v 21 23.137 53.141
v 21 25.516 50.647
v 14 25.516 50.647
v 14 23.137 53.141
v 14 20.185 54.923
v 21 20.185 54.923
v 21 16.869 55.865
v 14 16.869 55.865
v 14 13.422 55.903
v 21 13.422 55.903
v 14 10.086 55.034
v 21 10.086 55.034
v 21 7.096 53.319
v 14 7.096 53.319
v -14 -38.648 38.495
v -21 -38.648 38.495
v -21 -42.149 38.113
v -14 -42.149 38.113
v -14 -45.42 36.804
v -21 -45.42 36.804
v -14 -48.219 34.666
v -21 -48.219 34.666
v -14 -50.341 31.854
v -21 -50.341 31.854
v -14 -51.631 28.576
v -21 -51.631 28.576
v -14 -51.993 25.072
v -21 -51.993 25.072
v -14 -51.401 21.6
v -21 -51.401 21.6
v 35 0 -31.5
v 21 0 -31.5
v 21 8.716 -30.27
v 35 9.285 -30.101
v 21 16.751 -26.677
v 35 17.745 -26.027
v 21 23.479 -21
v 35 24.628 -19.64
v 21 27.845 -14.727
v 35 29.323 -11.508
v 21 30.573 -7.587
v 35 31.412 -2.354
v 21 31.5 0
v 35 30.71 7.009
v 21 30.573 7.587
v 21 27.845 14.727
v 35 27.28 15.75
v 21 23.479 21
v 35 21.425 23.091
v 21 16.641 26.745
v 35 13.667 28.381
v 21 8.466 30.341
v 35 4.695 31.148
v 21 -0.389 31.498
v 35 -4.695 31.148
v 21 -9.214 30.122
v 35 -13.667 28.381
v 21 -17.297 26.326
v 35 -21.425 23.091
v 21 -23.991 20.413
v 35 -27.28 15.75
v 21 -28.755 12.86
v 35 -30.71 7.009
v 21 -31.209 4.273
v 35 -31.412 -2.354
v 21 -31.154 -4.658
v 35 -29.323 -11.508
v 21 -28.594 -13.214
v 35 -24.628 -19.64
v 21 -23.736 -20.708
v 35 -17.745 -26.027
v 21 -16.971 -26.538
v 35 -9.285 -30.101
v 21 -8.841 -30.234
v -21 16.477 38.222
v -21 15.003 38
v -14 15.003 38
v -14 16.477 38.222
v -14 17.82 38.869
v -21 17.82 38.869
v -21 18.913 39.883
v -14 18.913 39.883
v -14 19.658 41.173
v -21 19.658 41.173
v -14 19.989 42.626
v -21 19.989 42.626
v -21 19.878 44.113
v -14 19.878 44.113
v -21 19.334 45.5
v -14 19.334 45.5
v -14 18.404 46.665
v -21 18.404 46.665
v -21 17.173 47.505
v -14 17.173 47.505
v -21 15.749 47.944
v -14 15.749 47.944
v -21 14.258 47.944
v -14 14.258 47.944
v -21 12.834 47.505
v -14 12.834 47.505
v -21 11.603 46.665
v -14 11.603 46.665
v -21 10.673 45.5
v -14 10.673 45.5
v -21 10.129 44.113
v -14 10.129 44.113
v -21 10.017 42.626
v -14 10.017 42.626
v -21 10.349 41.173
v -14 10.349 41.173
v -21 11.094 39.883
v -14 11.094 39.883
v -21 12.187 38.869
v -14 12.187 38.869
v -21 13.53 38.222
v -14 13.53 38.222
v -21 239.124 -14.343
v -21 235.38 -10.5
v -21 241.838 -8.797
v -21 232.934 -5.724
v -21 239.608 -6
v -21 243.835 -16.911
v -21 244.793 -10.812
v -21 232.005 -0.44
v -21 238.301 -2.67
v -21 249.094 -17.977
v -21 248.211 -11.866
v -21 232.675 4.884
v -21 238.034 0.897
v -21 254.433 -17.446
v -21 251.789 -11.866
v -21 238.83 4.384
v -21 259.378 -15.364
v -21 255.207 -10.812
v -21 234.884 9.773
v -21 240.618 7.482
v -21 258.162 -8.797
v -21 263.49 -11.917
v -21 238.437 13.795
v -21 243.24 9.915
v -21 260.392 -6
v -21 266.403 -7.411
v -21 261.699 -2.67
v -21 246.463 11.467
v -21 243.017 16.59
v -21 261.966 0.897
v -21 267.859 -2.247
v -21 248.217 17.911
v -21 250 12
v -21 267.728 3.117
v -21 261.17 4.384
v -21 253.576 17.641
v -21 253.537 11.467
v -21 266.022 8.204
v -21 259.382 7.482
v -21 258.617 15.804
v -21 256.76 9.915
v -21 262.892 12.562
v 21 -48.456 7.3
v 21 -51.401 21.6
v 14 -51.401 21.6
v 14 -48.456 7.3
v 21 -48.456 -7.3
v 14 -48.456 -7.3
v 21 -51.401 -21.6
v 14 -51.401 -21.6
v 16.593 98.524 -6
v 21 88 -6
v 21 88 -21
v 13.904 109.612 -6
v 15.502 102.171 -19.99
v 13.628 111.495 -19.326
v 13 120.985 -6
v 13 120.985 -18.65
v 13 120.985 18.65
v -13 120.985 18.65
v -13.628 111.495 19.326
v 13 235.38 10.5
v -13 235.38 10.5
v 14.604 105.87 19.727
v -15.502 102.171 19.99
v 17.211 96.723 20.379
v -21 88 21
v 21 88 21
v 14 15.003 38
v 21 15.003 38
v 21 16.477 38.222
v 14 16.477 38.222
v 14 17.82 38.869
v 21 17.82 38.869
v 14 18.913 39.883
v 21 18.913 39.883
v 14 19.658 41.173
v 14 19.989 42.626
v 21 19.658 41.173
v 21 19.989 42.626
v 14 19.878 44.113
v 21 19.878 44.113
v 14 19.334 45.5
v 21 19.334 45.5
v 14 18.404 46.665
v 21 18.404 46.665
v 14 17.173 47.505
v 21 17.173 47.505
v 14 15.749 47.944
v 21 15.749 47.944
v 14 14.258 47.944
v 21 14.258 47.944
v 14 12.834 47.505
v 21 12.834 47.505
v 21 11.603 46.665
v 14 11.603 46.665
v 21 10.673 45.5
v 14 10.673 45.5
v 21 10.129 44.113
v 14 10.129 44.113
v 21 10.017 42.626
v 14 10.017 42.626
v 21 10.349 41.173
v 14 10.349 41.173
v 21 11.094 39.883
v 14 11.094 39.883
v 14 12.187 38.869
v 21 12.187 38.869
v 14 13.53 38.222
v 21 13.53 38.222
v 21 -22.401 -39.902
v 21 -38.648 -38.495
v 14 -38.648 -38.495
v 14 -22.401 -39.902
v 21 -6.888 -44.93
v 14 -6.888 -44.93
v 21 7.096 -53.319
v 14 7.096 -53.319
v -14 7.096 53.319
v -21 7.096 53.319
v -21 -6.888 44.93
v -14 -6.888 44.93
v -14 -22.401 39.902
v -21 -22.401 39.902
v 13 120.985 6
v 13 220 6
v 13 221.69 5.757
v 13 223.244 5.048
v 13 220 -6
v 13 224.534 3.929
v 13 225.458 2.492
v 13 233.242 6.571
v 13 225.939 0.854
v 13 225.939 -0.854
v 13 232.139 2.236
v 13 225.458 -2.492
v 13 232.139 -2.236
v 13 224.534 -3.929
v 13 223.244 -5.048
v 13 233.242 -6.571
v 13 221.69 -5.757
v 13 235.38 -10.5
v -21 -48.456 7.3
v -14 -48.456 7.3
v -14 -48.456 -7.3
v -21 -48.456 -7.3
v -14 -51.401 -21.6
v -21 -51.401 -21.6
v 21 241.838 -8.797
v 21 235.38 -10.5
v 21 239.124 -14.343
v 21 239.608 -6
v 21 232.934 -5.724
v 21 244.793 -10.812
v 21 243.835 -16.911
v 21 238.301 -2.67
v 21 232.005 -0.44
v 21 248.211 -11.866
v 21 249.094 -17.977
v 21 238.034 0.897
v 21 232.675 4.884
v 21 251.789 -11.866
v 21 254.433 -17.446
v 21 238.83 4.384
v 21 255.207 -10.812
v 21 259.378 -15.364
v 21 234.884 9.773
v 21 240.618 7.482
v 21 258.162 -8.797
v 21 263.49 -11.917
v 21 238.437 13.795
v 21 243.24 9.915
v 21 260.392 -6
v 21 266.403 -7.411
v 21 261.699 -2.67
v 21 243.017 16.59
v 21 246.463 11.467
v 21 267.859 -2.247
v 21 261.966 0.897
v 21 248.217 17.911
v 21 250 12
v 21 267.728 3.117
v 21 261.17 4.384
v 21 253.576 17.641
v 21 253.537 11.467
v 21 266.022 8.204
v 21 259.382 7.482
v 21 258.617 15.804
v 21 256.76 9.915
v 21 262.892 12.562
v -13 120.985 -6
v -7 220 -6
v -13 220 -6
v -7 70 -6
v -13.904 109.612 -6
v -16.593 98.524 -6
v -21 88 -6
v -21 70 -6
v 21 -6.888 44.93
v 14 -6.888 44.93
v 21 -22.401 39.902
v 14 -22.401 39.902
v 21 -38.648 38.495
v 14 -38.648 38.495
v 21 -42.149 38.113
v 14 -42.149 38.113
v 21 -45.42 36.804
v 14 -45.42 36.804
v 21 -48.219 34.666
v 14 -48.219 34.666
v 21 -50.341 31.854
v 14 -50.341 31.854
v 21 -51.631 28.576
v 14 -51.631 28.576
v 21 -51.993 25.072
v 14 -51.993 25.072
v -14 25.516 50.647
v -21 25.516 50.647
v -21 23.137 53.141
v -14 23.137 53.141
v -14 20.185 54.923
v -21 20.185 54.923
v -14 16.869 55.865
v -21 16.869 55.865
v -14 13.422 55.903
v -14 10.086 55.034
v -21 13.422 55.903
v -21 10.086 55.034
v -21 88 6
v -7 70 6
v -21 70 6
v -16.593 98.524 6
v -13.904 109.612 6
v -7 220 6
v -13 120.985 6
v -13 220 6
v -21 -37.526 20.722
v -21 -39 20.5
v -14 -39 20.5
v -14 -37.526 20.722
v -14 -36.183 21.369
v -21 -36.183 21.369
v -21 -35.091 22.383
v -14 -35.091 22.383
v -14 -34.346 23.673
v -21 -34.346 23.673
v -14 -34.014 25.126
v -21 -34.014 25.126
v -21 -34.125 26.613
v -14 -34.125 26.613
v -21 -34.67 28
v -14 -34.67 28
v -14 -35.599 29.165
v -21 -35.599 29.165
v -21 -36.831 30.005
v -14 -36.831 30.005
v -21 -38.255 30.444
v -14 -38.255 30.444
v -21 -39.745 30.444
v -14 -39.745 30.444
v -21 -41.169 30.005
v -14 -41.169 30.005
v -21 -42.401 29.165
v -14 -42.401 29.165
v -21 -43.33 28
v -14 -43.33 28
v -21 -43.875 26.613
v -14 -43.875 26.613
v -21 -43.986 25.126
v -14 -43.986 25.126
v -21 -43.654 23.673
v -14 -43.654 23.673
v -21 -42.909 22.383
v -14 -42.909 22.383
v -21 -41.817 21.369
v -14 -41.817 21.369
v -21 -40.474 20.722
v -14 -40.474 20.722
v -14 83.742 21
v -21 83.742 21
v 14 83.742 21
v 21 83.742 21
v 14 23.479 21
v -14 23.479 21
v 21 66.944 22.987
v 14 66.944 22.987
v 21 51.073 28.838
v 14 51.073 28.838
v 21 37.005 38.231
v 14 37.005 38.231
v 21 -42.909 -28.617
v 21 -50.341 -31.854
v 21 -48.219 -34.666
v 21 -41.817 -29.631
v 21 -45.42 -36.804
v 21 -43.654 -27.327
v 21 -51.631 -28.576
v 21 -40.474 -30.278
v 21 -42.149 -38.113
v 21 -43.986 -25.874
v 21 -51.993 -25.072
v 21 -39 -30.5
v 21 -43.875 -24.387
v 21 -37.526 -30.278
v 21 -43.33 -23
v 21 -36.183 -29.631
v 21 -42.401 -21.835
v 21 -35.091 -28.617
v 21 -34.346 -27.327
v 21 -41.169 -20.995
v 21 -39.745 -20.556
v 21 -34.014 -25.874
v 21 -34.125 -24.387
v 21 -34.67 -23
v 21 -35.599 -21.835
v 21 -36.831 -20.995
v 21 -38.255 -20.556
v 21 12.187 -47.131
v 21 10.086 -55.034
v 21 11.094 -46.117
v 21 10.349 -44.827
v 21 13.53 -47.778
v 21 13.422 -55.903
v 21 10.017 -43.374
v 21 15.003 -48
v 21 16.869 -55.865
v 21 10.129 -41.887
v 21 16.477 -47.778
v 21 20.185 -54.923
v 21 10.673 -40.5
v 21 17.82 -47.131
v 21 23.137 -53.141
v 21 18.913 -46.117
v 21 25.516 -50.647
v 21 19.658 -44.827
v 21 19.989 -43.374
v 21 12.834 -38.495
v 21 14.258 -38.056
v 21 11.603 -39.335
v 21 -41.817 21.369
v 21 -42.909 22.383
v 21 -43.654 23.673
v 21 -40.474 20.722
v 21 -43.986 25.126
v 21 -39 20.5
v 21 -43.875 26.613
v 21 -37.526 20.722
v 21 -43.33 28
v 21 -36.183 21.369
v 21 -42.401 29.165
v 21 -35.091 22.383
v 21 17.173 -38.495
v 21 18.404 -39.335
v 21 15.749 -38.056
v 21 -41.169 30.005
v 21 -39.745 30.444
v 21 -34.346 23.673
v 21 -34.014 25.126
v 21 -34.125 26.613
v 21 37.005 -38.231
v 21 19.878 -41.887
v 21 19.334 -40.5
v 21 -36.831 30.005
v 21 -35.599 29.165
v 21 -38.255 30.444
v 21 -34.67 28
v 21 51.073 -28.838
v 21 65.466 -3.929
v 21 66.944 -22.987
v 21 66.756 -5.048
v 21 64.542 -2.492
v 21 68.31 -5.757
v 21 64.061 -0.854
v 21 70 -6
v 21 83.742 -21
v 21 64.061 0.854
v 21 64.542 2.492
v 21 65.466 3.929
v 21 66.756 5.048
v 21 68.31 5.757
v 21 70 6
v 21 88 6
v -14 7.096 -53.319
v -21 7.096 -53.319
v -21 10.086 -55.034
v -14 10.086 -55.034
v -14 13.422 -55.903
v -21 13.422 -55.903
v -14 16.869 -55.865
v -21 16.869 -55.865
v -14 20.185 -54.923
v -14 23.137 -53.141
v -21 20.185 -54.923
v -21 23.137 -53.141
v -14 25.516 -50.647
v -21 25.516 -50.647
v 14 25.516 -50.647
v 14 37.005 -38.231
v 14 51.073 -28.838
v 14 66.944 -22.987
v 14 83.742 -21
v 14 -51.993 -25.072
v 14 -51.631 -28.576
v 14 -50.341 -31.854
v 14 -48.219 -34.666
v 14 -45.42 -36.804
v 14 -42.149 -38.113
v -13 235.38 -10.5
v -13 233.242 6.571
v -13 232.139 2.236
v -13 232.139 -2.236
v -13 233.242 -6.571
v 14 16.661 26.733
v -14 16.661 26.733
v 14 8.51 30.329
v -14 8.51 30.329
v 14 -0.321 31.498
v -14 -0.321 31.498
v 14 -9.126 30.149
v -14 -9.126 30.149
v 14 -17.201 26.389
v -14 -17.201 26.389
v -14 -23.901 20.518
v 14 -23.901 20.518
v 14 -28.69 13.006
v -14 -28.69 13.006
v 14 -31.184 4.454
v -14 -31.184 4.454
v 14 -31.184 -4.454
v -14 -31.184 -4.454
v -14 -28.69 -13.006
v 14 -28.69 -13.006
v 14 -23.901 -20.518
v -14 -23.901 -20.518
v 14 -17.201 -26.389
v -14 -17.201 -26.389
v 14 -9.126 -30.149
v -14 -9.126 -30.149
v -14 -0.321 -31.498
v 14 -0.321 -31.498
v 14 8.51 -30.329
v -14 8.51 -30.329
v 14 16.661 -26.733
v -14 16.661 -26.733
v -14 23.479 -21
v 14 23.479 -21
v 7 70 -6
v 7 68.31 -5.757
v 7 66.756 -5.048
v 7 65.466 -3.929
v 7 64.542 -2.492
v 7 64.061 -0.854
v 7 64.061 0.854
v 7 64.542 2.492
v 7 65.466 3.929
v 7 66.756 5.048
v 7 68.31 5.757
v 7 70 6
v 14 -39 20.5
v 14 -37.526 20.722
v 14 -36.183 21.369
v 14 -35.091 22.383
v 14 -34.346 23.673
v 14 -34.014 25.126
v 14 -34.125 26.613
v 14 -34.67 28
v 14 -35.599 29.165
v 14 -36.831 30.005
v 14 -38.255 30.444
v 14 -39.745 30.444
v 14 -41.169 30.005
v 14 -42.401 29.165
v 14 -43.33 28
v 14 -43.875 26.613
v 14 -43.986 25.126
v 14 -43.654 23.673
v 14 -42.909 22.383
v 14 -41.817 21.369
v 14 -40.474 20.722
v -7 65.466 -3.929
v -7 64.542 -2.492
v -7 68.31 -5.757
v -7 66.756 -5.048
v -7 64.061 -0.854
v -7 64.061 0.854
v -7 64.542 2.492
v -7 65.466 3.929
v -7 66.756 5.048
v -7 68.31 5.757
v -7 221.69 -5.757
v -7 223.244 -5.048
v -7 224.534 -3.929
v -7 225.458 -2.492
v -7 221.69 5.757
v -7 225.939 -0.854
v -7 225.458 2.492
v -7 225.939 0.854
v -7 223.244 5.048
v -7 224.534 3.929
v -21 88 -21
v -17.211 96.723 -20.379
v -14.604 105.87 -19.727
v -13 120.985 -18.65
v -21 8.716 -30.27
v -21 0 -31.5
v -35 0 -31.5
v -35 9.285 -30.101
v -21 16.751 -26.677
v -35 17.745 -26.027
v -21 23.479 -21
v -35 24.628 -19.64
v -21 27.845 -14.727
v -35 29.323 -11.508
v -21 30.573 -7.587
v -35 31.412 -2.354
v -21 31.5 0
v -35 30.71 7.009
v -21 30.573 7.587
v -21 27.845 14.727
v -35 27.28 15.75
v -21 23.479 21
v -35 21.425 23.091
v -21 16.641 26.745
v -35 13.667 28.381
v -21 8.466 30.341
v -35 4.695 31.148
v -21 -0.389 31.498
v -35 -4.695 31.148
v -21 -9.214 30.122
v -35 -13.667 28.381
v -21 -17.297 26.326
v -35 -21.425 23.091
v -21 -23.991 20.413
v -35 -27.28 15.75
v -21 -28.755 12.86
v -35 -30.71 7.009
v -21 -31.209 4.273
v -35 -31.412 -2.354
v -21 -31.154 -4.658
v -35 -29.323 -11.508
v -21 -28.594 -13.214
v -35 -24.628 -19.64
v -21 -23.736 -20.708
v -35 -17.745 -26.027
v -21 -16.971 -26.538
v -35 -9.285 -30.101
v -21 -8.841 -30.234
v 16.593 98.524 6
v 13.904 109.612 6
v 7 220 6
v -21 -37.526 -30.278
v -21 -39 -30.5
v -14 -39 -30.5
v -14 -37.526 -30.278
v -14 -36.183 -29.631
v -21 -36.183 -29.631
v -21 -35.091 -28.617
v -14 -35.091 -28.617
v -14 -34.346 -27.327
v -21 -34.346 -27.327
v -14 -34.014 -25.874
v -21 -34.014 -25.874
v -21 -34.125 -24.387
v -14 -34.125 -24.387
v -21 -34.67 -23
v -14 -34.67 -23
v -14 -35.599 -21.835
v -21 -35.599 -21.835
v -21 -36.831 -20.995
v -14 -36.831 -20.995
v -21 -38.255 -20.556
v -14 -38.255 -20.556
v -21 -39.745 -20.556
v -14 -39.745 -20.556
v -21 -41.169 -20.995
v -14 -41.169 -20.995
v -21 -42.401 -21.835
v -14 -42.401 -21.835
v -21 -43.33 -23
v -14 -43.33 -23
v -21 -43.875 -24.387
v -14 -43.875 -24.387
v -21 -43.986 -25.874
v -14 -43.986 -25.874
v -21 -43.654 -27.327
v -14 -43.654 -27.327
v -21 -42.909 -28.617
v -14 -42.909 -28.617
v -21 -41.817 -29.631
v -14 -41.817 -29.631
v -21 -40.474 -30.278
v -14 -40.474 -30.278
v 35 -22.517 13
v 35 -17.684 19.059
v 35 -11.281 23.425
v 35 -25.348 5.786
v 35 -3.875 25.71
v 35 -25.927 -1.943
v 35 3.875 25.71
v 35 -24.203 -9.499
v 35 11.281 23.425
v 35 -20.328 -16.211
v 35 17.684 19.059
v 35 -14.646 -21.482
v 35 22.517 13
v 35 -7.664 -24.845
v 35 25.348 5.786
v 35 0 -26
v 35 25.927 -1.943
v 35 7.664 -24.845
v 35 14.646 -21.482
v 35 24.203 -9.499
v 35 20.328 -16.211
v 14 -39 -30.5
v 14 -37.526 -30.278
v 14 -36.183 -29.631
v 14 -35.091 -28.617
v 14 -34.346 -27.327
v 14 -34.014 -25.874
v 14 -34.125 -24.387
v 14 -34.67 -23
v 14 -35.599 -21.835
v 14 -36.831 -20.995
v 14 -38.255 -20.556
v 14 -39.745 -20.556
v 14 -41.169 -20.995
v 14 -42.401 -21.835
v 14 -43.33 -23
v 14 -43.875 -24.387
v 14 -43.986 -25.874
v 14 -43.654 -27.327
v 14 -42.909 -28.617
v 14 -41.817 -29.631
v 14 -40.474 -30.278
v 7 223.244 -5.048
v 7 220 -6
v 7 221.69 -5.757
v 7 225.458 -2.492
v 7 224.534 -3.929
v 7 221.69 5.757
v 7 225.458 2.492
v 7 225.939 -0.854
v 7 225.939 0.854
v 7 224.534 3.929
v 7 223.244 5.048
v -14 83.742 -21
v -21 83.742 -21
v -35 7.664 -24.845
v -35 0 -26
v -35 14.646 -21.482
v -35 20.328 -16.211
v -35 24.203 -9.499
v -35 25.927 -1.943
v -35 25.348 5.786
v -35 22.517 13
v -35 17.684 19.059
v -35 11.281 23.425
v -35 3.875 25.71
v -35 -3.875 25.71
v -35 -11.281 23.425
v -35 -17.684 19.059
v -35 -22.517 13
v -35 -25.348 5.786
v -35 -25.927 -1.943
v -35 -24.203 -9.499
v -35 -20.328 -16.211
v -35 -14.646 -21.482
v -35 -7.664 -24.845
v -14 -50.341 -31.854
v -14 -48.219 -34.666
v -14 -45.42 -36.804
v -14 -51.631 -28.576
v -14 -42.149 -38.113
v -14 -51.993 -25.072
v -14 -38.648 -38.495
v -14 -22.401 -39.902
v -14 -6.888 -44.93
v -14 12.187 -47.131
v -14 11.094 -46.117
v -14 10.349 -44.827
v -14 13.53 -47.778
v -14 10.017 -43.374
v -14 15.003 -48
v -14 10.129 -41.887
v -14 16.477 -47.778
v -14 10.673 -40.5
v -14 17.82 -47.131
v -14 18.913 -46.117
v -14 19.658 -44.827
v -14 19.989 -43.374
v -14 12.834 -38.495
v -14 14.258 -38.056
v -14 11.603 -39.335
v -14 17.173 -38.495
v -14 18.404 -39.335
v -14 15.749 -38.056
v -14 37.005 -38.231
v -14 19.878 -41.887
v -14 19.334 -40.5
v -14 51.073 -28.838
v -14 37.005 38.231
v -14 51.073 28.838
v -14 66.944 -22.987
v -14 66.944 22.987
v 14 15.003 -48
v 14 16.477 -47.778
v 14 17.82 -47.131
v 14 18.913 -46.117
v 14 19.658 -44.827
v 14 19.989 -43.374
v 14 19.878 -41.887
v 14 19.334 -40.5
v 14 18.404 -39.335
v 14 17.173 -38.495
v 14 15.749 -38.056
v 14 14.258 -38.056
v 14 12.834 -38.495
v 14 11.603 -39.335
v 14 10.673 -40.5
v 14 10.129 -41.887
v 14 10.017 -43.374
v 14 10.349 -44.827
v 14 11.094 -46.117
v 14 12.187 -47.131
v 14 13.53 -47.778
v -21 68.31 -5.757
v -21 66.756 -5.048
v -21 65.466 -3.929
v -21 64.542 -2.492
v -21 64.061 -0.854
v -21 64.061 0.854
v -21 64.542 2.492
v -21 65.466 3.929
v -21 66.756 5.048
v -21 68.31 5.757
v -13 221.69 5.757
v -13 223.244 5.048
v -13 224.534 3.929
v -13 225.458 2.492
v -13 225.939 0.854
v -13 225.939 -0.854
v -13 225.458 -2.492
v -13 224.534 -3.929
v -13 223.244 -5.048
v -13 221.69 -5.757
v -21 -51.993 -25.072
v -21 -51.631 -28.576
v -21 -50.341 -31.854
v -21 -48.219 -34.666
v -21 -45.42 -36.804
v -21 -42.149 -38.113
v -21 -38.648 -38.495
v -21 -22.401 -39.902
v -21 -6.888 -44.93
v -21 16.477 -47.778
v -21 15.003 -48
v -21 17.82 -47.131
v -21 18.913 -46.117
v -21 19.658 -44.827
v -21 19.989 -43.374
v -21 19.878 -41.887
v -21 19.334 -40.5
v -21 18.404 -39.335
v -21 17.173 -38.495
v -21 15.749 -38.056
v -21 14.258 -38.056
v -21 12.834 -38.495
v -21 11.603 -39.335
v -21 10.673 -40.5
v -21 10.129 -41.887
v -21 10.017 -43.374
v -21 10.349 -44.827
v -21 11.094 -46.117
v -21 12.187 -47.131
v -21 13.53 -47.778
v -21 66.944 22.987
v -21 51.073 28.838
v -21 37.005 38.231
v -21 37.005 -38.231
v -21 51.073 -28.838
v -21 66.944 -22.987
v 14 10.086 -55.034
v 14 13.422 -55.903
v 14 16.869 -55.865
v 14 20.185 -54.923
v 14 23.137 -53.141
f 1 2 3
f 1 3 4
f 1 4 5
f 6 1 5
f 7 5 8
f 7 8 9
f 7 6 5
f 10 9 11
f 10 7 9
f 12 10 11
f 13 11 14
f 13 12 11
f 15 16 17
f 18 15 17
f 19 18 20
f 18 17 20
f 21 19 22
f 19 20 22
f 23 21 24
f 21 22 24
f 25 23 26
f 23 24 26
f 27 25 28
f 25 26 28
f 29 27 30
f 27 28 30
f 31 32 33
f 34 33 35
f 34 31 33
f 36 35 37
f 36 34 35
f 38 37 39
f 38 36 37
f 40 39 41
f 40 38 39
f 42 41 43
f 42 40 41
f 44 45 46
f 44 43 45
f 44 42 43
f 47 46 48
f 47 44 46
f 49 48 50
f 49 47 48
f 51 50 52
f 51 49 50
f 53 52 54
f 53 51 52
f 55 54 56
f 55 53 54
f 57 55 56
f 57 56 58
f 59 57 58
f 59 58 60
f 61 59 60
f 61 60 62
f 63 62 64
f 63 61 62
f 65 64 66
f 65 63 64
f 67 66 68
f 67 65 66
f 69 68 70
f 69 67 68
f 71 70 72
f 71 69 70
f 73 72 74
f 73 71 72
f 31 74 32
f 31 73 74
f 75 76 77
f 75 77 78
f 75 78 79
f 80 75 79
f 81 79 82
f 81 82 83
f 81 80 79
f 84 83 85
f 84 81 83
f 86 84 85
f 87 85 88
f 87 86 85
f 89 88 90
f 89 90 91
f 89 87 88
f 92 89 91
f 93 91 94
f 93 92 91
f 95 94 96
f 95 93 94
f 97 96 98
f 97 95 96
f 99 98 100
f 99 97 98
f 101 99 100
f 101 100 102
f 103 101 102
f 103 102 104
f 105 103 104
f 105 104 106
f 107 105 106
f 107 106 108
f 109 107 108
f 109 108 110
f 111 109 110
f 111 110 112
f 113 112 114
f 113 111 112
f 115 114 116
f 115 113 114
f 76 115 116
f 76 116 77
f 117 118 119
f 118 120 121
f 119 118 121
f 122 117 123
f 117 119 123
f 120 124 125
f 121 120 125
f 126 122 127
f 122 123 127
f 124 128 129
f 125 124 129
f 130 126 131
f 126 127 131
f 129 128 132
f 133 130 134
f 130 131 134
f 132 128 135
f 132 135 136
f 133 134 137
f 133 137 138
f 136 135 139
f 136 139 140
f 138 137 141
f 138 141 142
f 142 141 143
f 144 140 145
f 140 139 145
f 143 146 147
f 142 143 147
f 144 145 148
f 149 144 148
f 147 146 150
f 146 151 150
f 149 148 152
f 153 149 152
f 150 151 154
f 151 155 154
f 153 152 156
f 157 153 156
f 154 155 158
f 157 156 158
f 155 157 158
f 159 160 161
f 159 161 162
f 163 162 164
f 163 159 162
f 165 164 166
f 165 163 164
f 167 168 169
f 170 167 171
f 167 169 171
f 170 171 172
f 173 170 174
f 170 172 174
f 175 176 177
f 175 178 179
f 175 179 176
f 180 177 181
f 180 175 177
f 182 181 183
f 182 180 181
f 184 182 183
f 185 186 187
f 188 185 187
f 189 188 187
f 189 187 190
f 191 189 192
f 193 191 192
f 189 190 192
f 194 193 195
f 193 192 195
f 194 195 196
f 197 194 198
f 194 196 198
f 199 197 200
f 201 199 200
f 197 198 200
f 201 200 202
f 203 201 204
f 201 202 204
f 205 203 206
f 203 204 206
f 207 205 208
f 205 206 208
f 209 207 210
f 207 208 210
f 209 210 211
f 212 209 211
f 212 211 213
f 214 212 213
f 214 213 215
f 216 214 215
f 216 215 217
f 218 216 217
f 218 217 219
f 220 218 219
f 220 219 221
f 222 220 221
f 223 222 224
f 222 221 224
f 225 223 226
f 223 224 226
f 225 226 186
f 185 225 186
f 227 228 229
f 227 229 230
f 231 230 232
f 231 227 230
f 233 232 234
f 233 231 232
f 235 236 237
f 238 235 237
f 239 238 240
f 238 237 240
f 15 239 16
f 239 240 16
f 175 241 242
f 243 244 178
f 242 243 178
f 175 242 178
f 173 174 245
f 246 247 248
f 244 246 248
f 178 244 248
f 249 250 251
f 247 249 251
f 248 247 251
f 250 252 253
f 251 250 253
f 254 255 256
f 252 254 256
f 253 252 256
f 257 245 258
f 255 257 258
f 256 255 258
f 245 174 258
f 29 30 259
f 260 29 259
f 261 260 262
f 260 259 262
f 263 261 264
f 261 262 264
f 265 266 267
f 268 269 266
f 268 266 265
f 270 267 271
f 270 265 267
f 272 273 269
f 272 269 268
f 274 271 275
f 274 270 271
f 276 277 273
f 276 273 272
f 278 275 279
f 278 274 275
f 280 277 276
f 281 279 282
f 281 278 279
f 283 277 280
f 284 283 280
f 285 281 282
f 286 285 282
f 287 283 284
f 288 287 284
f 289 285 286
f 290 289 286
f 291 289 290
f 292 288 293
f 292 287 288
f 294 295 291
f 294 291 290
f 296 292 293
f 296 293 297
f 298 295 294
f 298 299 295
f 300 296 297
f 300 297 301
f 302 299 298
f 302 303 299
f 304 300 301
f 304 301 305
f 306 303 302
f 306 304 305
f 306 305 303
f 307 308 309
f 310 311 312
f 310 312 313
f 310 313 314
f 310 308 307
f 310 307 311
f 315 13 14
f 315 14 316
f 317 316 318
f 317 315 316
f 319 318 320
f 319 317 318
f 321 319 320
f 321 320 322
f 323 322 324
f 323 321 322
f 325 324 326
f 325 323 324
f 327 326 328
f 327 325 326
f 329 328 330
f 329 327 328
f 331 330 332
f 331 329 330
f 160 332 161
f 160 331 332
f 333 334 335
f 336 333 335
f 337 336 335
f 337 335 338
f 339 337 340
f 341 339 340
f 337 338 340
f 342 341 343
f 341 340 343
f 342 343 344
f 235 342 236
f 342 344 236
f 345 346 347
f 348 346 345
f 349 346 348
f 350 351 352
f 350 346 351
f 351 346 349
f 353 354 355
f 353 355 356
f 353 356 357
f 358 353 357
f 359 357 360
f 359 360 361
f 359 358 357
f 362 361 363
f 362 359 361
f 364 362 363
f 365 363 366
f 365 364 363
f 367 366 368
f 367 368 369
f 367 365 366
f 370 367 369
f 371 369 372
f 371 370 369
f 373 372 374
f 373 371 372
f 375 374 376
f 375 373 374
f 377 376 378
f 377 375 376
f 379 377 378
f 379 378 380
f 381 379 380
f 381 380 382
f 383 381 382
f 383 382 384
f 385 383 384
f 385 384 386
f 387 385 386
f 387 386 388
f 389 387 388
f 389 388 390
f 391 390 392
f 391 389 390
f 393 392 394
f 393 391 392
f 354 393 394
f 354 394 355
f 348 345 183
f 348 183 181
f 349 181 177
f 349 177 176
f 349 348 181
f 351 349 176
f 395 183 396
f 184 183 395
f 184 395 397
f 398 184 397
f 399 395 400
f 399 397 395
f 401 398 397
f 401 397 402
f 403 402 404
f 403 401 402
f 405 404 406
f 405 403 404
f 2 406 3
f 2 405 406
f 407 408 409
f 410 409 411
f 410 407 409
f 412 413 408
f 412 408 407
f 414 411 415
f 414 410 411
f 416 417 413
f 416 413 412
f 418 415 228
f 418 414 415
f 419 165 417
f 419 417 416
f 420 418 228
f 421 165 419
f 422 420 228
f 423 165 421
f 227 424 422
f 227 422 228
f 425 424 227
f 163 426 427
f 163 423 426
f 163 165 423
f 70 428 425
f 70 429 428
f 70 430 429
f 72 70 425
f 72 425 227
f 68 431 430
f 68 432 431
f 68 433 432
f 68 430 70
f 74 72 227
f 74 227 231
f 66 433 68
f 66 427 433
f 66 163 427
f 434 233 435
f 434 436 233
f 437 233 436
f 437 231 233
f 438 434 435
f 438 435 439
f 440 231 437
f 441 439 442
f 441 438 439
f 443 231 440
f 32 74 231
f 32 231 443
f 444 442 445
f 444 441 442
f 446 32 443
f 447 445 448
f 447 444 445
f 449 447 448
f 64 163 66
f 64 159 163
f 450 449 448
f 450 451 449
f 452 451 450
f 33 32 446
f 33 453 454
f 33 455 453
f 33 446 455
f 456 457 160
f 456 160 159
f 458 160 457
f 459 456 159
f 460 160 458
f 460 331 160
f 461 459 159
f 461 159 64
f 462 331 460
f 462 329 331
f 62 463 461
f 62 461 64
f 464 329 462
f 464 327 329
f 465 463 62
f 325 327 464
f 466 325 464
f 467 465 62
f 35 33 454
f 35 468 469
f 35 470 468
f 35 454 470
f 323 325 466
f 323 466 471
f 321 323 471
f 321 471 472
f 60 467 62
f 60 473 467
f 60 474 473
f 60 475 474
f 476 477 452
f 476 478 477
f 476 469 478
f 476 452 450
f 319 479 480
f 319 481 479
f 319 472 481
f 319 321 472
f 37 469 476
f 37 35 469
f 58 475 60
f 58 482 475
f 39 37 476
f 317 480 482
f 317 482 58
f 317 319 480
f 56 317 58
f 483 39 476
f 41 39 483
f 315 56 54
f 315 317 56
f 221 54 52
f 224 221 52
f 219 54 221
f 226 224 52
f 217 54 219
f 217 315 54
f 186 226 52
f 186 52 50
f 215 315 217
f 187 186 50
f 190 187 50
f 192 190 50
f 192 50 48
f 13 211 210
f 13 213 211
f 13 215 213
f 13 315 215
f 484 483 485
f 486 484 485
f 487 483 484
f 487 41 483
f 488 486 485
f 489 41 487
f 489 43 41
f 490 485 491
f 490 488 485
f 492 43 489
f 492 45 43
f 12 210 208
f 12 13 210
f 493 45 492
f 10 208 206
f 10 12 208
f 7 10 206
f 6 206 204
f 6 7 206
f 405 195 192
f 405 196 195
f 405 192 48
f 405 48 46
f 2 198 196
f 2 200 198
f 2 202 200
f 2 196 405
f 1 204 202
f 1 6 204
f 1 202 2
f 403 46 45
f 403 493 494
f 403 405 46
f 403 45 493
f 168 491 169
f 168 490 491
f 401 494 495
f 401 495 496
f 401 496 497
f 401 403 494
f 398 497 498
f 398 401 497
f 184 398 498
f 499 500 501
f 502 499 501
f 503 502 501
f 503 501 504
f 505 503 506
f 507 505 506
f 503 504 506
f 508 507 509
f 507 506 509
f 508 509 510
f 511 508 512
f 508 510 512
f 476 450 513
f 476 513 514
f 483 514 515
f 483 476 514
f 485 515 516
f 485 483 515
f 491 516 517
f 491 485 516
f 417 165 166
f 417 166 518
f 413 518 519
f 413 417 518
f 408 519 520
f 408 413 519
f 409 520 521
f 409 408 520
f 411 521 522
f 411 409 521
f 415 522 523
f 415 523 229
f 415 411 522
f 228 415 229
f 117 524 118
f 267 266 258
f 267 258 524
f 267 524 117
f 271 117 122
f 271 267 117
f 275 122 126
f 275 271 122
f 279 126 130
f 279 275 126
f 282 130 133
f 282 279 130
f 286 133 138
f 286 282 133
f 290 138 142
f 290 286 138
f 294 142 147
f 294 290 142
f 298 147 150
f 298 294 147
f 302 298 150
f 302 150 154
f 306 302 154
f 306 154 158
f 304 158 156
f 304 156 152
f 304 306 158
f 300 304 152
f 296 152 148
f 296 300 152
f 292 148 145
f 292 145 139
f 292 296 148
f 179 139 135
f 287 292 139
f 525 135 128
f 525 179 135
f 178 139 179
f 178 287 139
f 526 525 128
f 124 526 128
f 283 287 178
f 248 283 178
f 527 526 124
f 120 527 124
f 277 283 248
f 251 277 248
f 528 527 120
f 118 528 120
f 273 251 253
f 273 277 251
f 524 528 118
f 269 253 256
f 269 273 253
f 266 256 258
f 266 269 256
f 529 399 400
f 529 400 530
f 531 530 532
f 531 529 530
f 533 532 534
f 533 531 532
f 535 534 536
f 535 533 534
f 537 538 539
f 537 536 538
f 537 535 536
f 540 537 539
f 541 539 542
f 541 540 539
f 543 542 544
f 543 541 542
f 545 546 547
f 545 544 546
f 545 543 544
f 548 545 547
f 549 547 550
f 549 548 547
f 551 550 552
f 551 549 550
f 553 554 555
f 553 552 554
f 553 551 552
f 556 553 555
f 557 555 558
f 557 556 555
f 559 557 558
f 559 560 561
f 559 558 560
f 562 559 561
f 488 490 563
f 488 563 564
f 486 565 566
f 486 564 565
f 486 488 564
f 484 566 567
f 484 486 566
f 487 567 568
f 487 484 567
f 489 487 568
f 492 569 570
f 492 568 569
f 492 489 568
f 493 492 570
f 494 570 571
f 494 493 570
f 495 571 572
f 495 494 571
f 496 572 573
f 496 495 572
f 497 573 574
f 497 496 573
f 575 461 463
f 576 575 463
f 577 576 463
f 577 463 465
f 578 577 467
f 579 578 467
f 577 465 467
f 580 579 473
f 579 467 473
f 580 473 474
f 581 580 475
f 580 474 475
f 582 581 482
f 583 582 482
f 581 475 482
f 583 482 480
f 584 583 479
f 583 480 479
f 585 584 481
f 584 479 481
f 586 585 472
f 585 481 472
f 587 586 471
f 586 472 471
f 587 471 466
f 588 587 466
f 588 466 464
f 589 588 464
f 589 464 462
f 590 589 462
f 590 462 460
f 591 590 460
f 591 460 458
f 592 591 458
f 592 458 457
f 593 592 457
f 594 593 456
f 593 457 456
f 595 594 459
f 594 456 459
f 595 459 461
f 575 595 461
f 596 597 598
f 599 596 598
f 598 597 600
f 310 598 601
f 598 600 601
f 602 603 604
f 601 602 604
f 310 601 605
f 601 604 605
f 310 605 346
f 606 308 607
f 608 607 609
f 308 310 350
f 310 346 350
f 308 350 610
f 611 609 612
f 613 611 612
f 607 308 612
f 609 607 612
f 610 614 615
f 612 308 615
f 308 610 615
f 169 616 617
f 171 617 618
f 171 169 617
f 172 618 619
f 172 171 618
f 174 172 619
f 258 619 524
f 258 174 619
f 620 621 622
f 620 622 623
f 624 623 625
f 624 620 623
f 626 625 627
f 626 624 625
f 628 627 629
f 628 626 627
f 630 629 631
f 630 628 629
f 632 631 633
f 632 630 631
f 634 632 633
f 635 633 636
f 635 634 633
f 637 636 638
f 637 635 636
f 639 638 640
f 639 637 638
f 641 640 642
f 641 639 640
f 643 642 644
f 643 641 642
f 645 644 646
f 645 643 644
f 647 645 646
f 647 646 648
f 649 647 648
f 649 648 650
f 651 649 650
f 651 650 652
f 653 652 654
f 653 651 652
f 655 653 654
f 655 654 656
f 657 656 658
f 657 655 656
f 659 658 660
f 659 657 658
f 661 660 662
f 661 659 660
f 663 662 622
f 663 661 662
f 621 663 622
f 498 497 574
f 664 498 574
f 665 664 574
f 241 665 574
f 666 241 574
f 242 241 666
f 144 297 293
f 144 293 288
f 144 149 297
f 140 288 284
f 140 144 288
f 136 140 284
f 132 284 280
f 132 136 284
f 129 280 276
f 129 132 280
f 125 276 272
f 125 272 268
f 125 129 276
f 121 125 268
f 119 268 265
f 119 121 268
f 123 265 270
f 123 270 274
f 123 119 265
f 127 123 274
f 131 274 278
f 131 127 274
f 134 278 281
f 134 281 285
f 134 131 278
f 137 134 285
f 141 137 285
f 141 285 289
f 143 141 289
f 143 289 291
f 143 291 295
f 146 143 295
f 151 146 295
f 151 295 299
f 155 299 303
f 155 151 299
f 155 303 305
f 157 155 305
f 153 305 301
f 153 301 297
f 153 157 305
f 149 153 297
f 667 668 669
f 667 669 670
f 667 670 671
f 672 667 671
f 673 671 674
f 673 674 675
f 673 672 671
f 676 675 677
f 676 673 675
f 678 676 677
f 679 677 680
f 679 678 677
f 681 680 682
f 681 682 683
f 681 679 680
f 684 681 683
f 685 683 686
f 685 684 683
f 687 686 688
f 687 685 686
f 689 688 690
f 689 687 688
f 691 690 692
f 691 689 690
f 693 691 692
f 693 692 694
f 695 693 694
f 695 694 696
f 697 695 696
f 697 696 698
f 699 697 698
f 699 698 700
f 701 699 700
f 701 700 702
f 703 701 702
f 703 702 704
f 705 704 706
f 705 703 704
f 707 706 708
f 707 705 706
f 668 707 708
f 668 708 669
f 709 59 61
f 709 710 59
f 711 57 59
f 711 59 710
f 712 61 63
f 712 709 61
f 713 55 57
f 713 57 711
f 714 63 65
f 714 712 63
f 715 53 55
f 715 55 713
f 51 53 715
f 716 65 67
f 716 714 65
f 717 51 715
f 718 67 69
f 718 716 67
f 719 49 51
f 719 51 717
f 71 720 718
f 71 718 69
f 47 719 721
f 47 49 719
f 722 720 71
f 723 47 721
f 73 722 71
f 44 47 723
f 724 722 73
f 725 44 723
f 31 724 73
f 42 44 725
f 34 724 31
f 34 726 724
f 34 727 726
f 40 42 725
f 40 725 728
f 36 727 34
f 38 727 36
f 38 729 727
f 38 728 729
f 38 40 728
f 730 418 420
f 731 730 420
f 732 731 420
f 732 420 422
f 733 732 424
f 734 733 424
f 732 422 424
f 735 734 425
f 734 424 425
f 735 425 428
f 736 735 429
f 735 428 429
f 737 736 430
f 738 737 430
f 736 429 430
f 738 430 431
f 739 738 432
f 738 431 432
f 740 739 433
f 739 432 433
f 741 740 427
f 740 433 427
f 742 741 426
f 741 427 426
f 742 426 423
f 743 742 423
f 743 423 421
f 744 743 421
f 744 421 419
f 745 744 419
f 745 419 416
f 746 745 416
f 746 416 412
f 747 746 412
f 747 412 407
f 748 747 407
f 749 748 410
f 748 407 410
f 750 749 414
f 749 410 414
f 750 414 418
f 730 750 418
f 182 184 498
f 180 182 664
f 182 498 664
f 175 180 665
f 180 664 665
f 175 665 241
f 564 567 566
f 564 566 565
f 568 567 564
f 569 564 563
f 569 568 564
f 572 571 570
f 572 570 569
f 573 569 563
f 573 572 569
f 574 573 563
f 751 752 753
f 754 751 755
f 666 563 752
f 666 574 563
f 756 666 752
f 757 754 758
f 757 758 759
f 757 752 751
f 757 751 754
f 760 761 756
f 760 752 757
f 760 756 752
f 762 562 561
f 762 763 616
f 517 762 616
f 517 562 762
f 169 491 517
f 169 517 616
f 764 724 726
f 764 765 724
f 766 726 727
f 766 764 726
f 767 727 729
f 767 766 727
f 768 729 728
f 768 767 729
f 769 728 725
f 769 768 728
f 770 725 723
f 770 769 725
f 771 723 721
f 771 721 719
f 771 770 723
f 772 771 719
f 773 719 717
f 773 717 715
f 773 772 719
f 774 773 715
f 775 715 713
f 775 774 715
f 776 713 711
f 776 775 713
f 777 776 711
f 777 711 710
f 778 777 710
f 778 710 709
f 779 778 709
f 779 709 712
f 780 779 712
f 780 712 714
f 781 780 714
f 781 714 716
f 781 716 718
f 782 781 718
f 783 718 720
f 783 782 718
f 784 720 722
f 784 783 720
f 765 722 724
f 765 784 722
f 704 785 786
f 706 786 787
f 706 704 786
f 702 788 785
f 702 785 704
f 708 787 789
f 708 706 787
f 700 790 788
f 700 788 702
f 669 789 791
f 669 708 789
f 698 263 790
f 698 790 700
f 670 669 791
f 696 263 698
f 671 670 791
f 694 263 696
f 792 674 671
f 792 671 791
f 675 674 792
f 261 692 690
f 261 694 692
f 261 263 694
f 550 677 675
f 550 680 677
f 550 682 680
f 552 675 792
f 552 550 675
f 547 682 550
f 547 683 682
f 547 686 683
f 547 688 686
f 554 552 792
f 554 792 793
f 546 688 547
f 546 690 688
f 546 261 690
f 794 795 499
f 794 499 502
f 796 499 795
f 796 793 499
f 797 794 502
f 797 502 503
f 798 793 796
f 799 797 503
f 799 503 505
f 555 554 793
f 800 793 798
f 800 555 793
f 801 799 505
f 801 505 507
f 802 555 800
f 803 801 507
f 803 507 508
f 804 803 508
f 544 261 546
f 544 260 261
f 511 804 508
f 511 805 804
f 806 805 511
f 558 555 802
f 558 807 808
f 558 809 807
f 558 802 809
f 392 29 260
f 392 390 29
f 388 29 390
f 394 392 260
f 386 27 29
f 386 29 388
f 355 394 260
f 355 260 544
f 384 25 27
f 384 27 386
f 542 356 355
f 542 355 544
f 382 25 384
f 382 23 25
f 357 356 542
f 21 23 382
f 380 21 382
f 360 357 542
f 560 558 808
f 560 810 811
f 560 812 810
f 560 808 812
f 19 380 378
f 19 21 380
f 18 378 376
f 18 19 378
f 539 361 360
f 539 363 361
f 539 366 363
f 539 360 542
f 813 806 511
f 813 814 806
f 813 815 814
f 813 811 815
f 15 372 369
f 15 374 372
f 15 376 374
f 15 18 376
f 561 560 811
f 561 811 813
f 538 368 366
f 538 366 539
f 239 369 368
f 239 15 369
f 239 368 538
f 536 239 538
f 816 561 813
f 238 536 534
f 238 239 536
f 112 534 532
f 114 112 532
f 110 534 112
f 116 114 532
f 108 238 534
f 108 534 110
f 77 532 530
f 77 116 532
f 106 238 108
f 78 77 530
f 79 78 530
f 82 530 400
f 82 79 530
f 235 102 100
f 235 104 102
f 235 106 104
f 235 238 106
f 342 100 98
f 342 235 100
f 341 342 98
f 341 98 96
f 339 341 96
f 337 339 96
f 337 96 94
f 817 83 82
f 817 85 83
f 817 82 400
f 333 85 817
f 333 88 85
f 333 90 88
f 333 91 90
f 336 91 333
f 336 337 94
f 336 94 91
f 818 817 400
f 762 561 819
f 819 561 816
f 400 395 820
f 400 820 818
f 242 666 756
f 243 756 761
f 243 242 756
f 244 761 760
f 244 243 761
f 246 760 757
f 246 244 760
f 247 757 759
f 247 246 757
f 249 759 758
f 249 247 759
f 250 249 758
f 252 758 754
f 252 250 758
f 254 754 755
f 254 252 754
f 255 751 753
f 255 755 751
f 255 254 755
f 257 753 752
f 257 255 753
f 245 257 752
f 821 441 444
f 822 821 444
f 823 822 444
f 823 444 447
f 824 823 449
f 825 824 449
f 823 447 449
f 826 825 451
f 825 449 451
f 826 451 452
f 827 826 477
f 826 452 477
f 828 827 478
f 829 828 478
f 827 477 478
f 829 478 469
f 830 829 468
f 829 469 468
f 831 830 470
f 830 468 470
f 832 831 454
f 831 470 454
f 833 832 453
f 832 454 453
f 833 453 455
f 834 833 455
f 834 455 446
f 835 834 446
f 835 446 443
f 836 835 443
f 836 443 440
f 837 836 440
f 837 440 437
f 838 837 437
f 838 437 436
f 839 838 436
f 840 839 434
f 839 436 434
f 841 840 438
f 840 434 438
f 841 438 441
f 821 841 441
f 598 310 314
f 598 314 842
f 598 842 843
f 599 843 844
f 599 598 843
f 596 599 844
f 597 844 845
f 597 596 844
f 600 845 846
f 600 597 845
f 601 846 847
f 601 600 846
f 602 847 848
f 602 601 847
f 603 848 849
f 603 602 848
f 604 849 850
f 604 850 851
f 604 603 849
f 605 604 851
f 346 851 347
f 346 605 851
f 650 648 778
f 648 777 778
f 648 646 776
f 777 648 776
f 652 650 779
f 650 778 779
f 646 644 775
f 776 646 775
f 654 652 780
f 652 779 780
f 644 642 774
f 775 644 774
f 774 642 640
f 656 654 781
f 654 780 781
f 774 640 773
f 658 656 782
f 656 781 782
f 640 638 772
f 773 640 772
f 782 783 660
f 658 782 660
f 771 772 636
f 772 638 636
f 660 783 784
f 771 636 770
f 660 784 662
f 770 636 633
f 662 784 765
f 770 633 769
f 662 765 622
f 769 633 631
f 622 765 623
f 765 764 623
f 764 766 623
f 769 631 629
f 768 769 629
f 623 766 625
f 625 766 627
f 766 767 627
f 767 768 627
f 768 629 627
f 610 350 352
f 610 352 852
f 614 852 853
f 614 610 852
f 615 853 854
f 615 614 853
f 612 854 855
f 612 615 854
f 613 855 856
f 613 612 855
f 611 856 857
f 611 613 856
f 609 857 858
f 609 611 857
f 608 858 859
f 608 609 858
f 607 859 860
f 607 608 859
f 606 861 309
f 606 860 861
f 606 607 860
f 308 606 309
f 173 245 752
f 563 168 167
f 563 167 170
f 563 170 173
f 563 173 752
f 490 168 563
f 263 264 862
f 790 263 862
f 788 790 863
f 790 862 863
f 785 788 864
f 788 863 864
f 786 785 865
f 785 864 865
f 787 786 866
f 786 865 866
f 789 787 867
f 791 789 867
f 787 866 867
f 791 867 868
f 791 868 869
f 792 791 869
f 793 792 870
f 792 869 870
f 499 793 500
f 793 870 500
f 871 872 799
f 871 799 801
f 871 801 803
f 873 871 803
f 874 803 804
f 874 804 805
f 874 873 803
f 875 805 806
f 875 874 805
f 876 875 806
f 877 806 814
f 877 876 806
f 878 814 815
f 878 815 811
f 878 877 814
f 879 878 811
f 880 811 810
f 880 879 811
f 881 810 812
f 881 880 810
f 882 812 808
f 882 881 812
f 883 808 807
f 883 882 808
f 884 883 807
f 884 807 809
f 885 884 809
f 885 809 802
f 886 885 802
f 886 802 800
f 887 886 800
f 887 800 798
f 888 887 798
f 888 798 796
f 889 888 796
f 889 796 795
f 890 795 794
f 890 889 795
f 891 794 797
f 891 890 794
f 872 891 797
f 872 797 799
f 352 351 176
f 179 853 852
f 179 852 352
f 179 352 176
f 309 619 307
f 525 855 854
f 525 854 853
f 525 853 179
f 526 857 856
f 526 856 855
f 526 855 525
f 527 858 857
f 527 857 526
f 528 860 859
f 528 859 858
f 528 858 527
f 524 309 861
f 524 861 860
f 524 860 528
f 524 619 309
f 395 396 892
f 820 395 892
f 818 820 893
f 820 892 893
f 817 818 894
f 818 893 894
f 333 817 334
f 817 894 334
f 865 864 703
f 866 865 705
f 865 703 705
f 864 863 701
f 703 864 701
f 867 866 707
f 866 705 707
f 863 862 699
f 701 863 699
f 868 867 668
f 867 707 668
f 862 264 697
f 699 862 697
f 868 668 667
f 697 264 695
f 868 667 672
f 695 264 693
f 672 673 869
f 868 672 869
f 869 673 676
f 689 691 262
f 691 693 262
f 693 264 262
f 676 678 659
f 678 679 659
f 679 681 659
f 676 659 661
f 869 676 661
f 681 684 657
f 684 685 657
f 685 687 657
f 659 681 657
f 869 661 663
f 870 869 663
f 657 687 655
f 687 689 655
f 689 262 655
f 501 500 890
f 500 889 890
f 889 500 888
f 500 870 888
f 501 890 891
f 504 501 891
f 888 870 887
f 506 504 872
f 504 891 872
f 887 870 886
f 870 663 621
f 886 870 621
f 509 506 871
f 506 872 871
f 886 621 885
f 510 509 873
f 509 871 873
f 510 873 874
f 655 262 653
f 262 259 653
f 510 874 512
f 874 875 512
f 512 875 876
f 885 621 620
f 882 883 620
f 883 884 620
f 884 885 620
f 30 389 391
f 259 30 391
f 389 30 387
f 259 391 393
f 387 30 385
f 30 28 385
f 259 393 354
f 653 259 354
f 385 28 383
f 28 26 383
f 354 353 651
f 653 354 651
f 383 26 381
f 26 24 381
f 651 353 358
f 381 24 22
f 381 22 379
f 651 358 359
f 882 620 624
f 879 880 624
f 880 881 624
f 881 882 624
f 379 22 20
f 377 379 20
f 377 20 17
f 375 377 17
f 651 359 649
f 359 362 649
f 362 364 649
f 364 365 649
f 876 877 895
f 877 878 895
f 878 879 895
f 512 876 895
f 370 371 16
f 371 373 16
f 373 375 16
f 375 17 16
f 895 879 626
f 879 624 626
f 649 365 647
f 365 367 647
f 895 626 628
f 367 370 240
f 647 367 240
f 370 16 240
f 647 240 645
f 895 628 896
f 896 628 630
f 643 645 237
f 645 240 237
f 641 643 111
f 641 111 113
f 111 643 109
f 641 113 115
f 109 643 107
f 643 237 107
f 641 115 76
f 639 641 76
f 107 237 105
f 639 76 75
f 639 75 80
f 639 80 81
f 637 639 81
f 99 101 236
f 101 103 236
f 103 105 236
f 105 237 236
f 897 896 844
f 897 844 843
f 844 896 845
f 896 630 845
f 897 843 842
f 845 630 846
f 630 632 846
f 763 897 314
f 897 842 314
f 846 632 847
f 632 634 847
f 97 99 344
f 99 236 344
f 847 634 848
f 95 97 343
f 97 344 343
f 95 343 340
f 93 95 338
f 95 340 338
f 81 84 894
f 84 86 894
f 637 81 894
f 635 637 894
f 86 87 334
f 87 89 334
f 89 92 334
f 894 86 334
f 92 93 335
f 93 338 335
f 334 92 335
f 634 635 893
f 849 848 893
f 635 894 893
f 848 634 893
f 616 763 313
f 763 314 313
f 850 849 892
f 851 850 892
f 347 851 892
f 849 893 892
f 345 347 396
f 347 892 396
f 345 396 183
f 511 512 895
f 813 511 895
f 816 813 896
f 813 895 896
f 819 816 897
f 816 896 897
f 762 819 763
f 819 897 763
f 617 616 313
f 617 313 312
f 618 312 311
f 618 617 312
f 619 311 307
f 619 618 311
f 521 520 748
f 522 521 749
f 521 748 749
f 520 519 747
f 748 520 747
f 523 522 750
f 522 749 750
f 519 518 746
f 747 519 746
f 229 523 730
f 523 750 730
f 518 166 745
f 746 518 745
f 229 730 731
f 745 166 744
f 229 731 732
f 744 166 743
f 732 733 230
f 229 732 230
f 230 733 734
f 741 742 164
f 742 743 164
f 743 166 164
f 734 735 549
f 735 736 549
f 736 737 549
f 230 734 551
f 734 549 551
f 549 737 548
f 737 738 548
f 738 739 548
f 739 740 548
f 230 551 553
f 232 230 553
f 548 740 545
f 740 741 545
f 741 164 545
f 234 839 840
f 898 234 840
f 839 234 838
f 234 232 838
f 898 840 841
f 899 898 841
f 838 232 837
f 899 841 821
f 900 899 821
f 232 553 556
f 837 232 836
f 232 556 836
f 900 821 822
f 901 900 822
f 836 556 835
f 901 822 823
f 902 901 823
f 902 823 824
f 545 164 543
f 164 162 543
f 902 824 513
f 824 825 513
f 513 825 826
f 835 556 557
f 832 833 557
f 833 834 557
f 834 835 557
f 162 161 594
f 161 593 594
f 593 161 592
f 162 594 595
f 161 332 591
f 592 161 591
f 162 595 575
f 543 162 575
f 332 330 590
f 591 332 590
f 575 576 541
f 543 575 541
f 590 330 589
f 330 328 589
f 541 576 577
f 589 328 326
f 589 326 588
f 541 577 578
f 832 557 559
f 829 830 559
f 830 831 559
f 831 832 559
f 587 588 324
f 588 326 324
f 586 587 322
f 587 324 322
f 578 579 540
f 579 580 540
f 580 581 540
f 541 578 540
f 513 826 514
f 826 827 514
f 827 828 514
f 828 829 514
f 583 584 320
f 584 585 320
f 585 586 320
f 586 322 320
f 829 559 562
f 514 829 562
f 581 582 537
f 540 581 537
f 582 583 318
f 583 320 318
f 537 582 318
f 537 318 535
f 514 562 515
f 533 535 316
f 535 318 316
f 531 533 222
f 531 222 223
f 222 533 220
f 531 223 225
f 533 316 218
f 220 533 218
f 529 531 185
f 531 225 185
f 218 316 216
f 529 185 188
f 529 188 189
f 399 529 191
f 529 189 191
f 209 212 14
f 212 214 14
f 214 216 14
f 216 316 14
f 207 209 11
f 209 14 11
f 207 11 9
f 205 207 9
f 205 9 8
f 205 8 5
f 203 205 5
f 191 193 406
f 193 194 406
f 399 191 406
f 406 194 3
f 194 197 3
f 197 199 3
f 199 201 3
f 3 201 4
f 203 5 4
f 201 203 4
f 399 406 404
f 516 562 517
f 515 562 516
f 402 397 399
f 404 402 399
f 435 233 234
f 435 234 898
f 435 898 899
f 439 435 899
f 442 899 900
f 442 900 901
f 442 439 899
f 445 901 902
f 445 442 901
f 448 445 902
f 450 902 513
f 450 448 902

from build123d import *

# Parameters (mm, degrees)
SKETCH1_R           = 31.5
SKETCH1_R_2         = 26
BOSS_EXTRUDE1_DEPTH = 35
SKETCH1_3_R         = 18
SKETCH1_3_R_2       = 12
BOSS_EXTRUDE2_DEPTH = 21
BOSS_EXTRUDE3_DEPTH = 21
BOSS_EXTRUDE4_DEPTH = 7
SKETCH2_R           = 5
BOSS_EXTRUDE5_DEPTH = 7
CUT_EXTRUDE6_START  = -21
CUT_EXTRUDE6_DEPTH  = 42
SKETCH1_7_R         = 18
SKETCH1_7_R_2       = 12
BOSS_EXTRUDE6_DEPTH = 21


with BuildPart() as part:
    # Sketch1 → Boss-Extrude1 (new, symmetric)
    with BuildSketch(Plane.YZ):
        with Locations(Location((0, 0, 0), (0, 0, 270))):
            Circle(SKETCH1_R)
        with Locations(Location((0, 0, 0), (0, 0, 270))):
            Circle(SKETCH1_R_2, mode=Mode.SUBTRACT)
    extrude(amount=BOSS_EXTRUDE1_DEPTH, both=True)



with BuildPart() as body_2:
    # Sketch1<3> → Boss-Extrude2 (new, symmetric)
    with BuildSketch(Plane.YZ):
        with Locations(Location((250, 0, 0), (0, 0, 90))):
            Circle(SKETCH1_3_R)
        with Locations(Location((250, 0, 0), (0, 0, 90))):
            Circle(SKETCH1_3_R_2, mode=Mode.SUBTRACT)
    extrude(amount=BOSS_EXTRUDE2_DEPTH, both=True)


with BuildPart() as part_1:
    add(part.part)

    add(body_2.part)  # Boss-Extrude3 merges body 2
    # Sketch1<4> → Boss-Extrude3 (add, symmetric)
    with BuildSketch(Plane.YZ):
        with BuildLine():
            Line((235.379808483, 10.5), (88, 21))
            Line((88, 21), (23.478713764, 21))
            ThreePointArc((23.478713764, 21), (29.426429307, 11.239895828), (31.5, 0))
            ThreePointArc((31.5, 0), (29.426429307, -11.239895828), (23.478713764, -21))
            Line((23.478713764, -21), (88, -21))
            Line((88, -21), (235.379808483, -10.5))
            ThreePointArc((235.379808483, -10.5), (232, 0), (235.379808483, 10.5))
        make_face()
        with BuildLine():
            ThreePointArc((70, -6), (64, 0), (70, 6))
            Line((70, 6), (220, 6))
            ThreePointArc((220, 6), (226, 0), (220, -6))
            Line((220, -6), (70, -6))
        make_face(mode=Mode.SUBTRACT)
    extrude(amount=BOSS_EXTRUDE3_DEPTH, both=True)

    # Sketch1<5> → Boss-Extrude4 (add, symmetric)
    with BuildSketch(Plane.YZ):
        with BuildLine():
            Line((70, -6), (220, -6))
            ThreePointArc((220, -6), (226, 0), (220, 6))
            Line((220, 6), (70, 6))
            ThreePointArc((70, 6), (64, 0), (70, -6))
        make_face()
    extrude(amount=BOSS_EXTRUDE4_DEPTH, both=True)

    # Sketch2 → Boss-Extrude5 (add)
    with BuildSketch(Plane.YZ.offset(21)):
        with BuildLine():
            ThreePointArc((25.516398298, -50.647058824), (51.072598285, -28.838439215), (83.742065952, -21))
            Line((83.742065952, -21), (23.478713764, -21))
            ThreePointArc((23.478713764, -21), (-31.5, 0), (23.478713764, 21))
            Line((23.478713764, 21), (83.742065952, 21))
            ThreePointArc((83.742065952, 21), (51.072598285, 28.838439215), (25.516398298, 50.647058824))
            ThreePointArc((25.516398298, 50.647058824), (16.869455228, 55.865378029), (7.0962671, 53.318757993))
            ThreePointArc((7.0962671, 53.318757993), (-14.501700837, 41.975317571), (-38.64781523, 38.495228582))
            ThreePointArc((-38.64781523, 38.495228582), (-49.375786098, 33.332181232), (-51.401209618, 21.6))
            ThreePointArc((-51.401209618, 21.6), (-48.08483212, 0), (-51.401209618, -21.6))
            ThreePointArc((-51.401209618, -21.6), (-49.375786098, -33.332181232), (-38.64781523, -38.495228582))
            ThreePointArc((-38.64781523, -38.495228582), (-14.501700837, -41.975317571), (7.0962671, -53.318757993))
            ThreePointArc((7.0962671, -53.318757993), (16.869455228, -55.865378029), (25.516398298, -50.647058824))
        make_face()
        with Locations(Location((15.003430528, -43, 0), (0, 0, 270))):
            Circle(SKETCH2_R, mode=Mode.SUBTRACT)
        with Locations(Location((-39, -25.5, 0), (0, 0, 270))):
            Circle(SKETCH2_R, mode=Mode.SUBTRACT)
        with Locations(Location((-39, 25.5, 0), (0, 0, 270))):
            Circle(SKETCH2_R, mode=Mode.SUBTRACT)
        with Locations(Location((15.003430528, 43, 0), (0, 0, 270))):
            Circle(SKETCH2_R, mode=Mode.SUBTRACT)
    boss_extrude5 = extrude(amount=-BOSS_EXTRUDE5_DEPTH)

    # Mirror1: Boss-Extrude5 across plane
    add(boss_extrude5.mirror(Plane(origin=(0, 0, 0), x_dir=(0, 0, 1), z_dir=(1, 0, 0))))

    # Cut-Extrude6: read off the stored shape, not the designer's step
    # Cut-Extrude6 outline → Cut-Extrude6 (cut)
    with BuildSketch(Plane(origin=(0, 0, 0), x_dir=(0, 1, 0), z_dir=(0, 0, 1)).offset(CUT_EXTRUDE6_START)):
        with BuildLine():
            ThreePointArc((88, 21), (104.014282256, 15.028577262), (120.984845005, 13))
            Line((120.984845005, 13), (235.379808483, 13))
            Line((235.379808483, 13), (235.379808483, 21))
            Line((235.379808483, 21), (88, 21))
        make_face()
    cut_extrude6 = extrude(amount=CUT_EXTRUDE6_DEPTH, mode=Mode.SUBTRACT)

    # Mirror2: Cut-Extrude6 across plane
    add(cut_extrude6.mirror(Plane(origin=(0, 0, 0), x_dir=(0, 0, 1), z_dir=(1, 0, 0))), mode=Mode.SUBTRACT)

    # Sketch1<7> → Boss-Extrude6 (add, symmetric)
    with BuildSketch(Plane.YZ):
        with Locations(Location((250, 0, 0), (0, 0, 270))):
            Circle(SKETCH1_7_R)
        with Locations(Location((250, 0, 0), (0, 0, 90))):
            Circle(SKETCH1_7_R_2, mode=Mode.SUBTRACT)
    extrude(amount=BOSS_EXTRUDE6_DEPTH, both=True)


solid = part_1.part
